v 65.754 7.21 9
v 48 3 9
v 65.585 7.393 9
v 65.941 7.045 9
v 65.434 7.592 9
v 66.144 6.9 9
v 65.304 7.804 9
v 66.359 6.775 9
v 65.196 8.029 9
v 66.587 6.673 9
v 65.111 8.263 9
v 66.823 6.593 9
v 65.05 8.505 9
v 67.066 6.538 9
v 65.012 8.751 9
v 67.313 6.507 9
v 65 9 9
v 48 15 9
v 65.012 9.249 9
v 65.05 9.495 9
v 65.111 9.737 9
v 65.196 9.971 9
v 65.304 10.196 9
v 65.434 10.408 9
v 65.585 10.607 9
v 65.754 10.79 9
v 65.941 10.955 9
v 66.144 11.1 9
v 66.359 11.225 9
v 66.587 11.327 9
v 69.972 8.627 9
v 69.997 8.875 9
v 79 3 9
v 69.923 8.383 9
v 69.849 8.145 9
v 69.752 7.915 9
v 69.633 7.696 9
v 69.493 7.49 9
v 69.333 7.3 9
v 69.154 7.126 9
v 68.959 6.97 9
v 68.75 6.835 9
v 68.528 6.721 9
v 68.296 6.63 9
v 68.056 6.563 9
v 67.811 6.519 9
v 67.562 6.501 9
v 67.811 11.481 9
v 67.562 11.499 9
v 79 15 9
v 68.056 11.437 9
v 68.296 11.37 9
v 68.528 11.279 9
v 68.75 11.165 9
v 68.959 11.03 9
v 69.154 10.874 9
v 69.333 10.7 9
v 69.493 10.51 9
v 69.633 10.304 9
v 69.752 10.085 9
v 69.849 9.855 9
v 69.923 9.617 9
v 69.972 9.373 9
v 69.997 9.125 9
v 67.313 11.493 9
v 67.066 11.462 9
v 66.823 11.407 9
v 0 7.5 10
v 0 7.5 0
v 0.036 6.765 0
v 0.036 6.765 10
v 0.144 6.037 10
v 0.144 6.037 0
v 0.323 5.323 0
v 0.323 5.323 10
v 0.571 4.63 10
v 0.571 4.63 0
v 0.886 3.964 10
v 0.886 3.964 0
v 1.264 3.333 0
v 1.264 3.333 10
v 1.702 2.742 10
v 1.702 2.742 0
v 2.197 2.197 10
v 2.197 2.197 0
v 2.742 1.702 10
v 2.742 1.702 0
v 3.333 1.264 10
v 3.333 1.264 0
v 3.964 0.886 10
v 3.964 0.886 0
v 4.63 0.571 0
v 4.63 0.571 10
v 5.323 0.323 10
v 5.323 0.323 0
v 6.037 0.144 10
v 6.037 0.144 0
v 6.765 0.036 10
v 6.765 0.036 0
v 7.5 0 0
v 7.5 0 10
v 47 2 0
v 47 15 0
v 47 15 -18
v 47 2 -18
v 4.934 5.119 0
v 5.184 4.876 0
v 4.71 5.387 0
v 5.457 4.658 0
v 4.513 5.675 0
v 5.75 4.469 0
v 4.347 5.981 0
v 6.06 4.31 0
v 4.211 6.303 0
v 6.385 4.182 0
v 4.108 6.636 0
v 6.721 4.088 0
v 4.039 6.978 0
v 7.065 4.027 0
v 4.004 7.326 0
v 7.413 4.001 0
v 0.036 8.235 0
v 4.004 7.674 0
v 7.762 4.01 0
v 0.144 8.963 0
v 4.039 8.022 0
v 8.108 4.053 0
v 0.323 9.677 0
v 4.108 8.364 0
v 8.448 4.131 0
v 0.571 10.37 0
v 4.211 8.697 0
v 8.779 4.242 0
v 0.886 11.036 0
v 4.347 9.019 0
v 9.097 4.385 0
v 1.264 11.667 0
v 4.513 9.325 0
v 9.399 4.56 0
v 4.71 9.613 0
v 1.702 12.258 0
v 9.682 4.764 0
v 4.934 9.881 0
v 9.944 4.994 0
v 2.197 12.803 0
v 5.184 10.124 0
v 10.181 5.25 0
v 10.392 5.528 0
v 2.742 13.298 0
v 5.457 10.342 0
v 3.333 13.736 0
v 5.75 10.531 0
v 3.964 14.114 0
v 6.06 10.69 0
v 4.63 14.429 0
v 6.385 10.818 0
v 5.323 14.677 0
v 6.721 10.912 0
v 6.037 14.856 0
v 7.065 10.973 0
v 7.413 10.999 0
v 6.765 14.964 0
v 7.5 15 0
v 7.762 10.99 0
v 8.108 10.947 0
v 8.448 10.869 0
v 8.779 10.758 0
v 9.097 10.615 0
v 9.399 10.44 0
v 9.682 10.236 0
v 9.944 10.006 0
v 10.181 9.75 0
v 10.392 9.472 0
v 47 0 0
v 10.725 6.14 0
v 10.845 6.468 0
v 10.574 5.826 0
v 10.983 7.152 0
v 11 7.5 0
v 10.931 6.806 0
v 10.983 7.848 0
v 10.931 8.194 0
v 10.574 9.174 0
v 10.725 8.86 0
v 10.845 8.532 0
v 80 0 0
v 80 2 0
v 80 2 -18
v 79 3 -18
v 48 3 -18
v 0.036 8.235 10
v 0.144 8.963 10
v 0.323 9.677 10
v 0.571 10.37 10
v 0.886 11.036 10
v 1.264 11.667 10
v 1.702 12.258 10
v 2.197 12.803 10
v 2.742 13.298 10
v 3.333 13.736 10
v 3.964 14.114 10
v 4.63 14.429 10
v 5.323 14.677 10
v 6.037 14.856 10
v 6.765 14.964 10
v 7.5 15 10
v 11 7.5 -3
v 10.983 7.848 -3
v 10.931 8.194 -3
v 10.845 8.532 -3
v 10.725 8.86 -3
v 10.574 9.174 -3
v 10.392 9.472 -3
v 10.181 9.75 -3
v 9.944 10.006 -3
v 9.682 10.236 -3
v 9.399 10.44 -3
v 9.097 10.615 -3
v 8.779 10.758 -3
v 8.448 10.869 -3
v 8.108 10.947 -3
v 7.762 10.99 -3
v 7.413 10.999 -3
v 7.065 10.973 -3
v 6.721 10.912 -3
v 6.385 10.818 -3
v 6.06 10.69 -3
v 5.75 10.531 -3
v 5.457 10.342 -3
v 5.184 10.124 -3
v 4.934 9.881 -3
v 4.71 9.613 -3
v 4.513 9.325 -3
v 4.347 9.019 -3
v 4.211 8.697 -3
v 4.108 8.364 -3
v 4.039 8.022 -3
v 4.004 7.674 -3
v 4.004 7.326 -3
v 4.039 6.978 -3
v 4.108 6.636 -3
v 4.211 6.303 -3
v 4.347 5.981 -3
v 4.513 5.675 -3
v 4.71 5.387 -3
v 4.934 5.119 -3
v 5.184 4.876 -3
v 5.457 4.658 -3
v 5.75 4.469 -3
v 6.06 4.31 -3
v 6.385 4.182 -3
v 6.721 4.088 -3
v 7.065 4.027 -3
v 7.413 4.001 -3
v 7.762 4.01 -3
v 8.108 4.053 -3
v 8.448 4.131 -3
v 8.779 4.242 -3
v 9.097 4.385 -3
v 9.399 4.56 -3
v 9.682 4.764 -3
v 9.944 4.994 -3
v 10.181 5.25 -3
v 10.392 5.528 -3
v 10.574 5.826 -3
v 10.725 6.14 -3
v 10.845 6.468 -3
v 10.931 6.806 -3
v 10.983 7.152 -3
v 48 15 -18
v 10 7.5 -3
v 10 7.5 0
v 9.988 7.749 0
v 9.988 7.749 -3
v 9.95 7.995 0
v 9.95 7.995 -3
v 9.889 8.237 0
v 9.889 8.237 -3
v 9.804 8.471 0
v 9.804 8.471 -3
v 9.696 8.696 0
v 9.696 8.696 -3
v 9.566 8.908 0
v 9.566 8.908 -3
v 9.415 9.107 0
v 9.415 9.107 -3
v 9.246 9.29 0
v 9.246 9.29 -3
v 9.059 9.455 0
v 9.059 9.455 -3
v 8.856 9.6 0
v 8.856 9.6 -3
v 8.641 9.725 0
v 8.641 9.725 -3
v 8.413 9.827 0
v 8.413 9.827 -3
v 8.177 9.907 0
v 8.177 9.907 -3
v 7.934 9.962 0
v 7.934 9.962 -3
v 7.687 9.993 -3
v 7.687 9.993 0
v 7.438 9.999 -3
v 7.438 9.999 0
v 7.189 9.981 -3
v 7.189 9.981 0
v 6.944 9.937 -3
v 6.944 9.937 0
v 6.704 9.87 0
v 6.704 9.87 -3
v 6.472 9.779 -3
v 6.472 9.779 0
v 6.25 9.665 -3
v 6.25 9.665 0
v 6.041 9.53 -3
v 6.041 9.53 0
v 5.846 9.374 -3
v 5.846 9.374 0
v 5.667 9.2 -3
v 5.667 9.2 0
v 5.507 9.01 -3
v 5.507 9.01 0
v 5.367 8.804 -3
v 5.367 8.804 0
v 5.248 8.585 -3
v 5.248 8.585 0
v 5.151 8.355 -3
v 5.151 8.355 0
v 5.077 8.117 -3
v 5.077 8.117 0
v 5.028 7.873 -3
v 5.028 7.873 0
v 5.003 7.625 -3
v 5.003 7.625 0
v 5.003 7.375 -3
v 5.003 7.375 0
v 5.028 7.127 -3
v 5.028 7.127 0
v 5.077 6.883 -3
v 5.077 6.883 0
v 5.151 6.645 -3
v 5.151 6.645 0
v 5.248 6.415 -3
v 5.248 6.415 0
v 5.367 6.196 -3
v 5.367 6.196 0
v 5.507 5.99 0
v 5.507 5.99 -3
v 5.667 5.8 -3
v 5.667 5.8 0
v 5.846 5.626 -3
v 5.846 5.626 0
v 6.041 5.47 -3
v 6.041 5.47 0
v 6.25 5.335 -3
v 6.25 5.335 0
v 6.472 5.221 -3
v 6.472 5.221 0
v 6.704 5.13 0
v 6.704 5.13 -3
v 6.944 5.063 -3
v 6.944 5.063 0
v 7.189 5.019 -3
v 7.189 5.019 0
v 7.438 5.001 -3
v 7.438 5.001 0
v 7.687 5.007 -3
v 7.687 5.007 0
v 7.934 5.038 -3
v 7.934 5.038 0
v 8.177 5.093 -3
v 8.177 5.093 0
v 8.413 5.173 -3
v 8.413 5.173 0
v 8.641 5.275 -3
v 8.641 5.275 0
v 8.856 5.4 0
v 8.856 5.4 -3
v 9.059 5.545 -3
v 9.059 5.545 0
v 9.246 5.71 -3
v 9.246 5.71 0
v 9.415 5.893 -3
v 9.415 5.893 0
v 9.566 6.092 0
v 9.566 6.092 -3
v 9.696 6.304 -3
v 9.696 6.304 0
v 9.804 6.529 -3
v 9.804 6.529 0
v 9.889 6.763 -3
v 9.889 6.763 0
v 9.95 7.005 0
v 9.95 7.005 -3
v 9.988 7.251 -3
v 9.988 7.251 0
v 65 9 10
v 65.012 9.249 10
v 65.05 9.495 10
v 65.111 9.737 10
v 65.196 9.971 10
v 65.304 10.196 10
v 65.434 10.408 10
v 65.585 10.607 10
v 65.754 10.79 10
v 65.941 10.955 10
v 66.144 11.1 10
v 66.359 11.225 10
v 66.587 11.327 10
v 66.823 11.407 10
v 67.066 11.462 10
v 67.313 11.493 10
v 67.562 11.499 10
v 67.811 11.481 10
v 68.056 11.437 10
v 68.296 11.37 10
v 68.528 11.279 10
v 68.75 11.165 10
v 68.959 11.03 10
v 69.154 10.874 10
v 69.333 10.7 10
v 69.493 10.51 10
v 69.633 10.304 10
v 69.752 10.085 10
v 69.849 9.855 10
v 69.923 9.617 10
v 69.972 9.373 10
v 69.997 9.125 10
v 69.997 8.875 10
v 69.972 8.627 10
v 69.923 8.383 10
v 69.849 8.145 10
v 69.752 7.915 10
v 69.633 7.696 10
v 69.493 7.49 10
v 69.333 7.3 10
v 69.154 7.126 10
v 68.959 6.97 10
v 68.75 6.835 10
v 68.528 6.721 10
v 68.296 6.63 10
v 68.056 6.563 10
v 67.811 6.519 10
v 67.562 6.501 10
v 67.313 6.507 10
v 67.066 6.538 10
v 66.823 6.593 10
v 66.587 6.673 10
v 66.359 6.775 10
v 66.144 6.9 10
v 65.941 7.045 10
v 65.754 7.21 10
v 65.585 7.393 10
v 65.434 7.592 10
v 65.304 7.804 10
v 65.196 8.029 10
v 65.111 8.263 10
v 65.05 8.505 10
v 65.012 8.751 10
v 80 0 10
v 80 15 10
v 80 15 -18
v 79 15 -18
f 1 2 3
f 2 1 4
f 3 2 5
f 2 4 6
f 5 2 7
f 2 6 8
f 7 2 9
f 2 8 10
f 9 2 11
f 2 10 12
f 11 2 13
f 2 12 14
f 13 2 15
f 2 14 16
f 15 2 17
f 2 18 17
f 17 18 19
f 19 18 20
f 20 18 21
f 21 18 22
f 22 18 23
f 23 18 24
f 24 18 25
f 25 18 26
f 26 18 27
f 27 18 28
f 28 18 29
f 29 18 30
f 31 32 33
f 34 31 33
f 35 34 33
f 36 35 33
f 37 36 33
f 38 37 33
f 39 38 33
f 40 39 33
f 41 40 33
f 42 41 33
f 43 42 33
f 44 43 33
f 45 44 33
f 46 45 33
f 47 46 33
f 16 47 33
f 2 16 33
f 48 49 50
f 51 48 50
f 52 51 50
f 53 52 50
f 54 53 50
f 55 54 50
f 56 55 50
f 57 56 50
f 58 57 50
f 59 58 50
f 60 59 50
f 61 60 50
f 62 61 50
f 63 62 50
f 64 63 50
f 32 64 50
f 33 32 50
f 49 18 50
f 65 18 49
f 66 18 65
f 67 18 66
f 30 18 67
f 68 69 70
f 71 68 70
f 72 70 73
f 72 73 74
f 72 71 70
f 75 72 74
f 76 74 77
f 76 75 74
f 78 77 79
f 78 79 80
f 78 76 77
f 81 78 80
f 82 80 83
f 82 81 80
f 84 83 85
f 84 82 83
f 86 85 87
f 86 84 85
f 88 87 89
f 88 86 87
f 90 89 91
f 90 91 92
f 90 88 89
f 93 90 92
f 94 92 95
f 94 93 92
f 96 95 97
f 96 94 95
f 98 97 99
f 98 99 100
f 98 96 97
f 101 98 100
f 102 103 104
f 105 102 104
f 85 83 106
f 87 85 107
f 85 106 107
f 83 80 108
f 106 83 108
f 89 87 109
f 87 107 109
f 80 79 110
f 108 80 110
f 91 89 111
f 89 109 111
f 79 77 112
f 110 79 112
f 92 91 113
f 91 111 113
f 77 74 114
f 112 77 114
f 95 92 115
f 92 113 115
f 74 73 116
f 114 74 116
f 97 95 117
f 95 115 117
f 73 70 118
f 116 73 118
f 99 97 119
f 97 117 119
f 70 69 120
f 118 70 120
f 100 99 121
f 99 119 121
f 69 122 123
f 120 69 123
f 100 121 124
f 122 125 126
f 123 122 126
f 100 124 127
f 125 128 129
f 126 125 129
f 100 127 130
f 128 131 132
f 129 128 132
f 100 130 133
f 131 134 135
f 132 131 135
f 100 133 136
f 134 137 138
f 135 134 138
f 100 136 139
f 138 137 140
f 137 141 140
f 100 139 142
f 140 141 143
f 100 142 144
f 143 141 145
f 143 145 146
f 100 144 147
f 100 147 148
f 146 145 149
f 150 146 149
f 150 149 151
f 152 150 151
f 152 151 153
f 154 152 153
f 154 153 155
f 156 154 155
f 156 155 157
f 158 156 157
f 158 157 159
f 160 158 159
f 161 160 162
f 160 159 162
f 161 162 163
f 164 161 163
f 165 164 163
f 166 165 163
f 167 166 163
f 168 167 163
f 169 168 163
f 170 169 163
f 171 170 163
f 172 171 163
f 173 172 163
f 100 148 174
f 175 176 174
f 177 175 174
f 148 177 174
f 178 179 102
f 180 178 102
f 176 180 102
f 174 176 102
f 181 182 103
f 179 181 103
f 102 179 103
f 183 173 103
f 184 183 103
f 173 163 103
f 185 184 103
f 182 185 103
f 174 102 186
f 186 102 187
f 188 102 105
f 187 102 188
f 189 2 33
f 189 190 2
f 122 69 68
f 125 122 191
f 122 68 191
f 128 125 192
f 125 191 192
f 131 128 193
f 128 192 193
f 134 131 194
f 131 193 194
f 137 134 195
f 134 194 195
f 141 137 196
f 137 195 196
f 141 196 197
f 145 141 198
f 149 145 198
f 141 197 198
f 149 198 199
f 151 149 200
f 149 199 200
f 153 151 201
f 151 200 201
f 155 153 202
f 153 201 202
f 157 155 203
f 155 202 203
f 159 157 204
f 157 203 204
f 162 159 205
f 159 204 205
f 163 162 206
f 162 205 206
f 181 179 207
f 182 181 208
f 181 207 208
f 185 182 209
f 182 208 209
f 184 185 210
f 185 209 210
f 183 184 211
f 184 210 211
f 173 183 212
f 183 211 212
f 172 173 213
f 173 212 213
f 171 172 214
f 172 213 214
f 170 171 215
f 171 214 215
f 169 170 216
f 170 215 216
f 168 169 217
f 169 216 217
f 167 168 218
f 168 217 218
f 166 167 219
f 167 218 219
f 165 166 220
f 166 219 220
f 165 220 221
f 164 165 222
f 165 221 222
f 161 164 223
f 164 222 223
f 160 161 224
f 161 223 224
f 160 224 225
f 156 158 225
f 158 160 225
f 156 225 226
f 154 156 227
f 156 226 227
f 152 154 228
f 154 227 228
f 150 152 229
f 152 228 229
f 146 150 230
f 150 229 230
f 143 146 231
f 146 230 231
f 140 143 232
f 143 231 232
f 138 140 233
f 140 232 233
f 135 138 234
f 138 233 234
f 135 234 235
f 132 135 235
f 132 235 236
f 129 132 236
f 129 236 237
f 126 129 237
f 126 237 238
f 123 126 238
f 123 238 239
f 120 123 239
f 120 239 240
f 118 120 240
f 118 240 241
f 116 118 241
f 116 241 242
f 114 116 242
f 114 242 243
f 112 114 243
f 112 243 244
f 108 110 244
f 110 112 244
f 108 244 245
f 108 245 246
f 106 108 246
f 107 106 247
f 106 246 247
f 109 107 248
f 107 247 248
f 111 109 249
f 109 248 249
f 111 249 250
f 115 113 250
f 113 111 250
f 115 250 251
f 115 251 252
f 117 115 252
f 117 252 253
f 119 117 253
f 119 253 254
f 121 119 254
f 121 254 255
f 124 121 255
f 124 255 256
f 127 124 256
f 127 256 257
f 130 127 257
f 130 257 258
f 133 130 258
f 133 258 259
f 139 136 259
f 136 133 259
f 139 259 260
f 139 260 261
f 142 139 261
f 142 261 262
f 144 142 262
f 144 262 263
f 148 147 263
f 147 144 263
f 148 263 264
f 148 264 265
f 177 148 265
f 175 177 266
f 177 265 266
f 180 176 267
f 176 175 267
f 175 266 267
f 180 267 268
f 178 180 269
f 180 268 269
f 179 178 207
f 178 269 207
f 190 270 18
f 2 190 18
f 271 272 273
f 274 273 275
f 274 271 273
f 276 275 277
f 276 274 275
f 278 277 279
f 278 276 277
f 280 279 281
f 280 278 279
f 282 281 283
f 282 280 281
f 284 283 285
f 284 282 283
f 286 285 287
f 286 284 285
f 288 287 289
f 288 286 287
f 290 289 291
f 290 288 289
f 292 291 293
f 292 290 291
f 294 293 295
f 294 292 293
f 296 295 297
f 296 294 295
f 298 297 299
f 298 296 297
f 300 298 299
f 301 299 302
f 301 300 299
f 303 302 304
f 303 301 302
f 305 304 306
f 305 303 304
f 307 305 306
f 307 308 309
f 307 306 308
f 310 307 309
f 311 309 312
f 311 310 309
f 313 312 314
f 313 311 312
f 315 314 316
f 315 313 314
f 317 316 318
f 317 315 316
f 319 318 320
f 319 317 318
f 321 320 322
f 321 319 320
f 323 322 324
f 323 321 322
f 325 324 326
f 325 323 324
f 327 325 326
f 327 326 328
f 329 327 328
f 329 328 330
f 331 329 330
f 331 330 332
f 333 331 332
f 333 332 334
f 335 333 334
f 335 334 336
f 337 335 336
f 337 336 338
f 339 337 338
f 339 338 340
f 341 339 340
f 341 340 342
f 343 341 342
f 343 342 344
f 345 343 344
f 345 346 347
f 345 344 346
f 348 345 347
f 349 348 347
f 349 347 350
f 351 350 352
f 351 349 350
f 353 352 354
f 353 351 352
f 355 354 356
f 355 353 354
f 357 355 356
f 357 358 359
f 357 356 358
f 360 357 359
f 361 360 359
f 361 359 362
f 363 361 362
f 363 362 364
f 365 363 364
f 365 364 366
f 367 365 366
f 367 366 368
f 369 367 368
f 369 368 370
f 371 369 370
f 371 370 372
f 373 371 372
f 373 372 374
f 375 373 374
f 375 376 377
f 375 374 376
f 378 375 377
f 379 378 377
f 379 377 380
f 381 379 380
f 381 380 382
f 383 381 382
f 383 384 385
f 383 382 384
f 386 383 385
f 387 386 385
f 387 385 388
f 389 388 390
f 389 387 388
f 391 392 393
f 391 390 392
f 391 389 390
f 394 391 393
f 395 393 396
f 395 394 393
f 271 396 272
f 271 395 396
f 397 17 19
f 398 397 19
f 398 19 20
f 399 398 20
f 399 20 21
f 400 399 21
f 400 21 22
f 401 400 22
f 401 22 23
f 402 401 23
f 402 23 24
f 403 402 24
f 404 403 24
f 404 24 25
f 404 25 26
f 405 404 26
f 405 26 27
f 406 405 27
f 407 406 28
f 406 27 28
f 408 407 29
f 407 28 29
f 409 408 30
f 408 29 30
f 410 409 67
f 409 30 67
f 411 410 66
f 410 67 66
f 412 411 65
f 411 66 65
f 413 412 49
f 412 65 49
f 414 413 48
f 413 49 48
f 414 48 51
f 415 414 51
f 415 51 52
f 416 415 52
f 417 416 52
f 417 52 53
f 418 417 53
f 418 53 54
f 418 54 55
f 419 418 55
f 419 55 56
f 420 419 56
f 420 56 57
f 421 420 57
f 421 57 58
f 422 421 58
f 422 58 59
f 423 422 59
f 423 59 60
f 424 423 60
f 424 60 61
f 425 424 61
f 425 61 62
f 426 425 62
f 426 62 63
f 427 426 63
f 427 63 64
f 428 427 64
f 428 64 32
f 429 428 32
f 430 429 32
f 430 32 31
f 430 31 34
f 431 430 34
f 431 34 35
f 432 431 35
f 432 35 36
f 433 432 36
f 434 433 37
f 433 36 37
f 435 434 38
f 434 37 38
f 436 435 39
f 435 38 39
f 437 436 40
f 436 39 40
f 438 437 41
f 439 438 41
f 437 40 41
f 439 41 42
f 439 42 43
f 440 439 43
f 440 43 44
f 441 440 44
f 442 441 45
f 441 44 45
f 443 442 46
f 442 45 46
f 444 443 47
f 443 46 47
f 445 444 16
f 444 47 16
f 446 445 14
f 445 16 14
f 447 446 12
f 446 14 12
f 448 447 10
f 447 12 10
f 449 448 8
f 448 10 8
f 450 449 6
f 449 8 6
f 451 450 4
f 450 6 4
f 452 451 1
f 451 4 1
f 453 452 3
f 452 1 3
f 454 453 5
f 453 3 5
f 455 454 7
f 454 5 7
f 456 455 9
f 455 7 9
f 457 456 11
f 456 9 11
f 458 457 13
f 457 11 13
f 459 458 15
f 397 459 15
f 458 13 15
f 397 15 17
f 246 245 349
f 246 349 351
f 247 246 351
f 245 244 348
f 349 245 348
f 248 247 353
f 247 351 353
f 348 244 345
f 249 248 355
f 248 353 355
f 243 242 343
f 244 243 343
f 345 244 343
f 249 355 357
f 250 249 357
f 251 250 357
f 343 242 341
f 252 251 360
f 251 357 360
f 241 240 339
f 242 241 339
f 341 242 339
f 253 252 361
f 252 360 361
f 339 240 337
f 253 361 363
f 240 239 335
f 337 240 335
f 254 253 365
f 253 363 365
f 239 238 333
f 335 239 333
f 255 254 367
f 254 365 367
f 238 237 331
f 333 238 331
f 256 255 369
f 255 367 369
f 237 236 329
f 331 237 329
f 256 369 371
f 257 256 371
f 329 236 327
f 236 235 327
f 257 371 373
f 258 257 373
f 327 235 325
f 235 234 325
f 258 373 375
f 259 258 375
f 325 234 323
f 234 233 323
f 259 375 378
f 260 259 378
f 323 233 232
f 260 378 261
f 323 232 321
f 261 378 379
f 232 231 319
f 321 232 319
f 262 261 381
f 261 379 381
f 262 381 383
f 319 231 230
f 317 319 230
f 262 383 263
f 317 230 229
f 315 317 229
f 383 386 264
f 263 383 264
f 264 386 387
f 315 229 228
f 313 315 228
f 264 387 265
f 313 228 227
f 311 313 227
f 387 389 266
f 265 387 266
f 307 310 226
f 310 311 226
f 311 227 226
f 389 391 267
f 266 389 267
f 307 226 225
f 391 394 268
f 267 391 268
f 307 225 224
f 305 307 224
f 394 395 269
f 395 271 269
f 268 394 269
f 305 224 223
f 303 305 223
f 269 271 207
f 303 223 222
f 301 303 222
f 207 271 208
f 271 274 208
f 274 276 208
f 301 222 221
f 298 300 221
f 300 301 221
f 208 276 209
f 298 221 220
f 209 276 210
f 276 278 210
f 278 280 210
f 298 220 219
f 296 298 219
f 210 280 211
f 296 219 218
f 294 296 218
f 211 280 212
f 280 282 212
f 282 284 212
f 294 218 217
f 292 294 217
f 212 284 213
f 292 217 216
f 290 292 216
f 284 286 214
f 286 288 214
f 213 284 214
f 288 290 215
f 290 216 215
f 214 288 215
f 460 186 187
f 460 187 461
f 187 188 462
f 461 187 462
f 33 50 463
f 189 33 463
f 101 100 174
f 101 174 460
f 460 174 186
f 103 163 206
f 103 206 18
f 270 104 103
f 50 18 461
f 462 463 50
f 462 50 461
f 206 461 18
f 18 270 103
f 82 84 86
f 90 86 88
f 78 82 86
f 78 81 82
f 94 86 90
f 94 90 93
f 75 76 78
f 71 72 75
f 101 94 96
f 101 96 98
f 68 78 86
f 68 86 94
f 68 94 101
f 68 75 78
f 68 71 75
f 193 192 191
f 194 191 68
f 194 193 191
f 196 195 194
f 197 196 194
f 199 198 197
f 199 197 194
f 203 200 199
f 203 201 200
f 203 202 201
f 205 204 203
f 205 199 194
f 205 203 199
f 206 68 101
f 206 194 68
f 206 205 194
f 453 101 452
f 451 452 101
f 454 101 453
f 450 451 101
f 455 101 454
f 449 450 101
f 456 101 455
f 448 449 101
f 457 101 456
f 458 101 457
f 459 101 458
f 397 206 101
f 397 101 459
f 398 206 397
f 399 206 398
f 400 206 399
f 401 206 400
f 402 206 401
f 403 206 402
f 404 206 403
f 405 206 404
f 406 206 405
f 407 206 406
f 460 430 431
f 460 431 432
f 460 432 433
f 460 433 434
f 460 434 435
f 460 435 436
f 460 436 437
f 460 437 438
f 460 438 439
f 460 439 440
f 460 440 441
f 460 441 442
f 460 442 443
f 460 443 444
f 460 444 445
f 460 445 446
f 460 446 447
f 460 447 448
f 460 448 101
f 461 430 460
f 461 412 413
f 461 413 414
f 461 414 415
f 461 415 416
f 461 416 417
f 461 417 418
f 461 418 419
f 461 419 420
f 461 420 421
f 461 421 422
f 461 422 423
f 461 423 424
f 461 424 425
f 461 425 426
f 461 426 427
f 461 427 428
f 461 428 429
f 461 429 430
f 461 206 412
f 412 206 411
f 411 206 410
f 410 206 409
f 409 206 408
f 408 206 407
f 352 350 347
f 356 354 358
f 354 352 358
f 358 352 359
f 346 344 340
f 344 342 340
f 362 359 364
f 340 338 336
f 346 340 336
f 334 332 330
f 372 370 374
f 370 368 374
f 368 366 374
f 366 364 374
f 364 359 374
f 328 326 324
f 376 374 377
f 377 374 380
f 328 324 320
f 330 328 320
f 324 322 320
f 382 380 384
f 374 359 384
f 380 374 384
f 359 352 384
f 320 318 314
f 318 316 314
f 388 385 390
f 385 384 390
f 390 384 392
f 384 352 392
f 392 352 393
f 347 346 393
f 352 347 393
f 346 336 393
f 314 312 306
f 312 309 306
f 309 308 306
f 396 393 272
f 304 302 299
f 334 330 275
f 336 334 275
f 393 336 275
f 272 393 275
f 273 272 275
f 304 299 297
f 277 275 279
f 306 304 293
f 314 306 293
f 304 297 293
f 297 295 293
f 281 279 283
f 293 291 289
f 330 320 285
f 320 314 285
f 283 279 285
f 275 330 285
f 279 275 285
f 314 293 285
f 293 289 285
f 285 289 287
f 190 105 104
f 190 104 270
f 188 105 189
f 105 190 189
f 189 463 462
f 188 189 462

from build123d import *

# Parameters (mm, degrees)
SKETCH1_W                = 80
SKETCH1_H                = 15
BOSS_EXTRUDE1_DEPTH      = 10
FILLET1_R                = 7.5
BOSS_EXTRUDE2_DEPTH      = 2
BOSS_EXTRUDE2_DEPTH_BACK = 13
SKETCH2_R                = 3.5
SKETCH2_R_2              = 2.5
SKETCH4_W                = 12.275600057
SKETCH4_H                = 15
CUT_EXTRUDE1_DEPTH       = 39
SKETCH6_W                = 10
SKETCH6_H                = 14.887271561
CUT_EXTRUDE2_DEPTH       = 39
SKETCH8_W                = 33
SKETCH8_H                = 28
BOSS_EXTRUDE3_DEPTH      = 15
CUT_EXTRUDE3_DEPTH       = 12
SKETCH10_W               = 33
SKETCH10_H               = 18
CUT_EXTRUDE4_DEPTH       = 2
SKETCH11_W               = 11.438718319
SKETCH11_H               = 15
CUT_EXTRUDE5_DEPTH       = 84.360662185
SKETCH12_R               = 2.5
CUT_EXTRUDE6_DEPTH       = 86.755466298


with BuildPart() as part:
    # Sketch1 → Boss-Extrude1 (new body)
    with BuildSketch(Plane.XY):
        with Locations((40, 7.5)):
            Rectangle(SKETCH1_W, SKETCH1_H)
    extrude(amount=BOSS_EXTRUDE1_DEPTH)

    # Fillet1
    fillet1_edges = [part.edges().sort_by_distance(p)[0] for p in [
        (0, 0, 5),
        (0, 15, 5),
    ]]
    fillet(fillet1_edges, radius=FILLET1_R - 0.0001)  # a hair under: the kernel refuses the full size

    # Sketch2 → Boss-Extrude2 (add, two sides: drawn at the far end of the back side and taken through both)
    # profile 1 of 2: a face of its own
    with BuildSketch(Plane.XY.offset(10).offset(-BOSS_EXTRUDE2_DEPTH_BACK)):
        with Locations((7.5, 7.5)):
            Circle(SKETCH2_R)
        with Locations((7.5, 7.5)):
            Circle(SKETCH2_R_2, mode=Mode.SUBTRACT)
    # profile 2 of 2: a face of its own
    with BuildSketch(Plane.XY.offset(10).offset(-BOSS_EXTRUDE2_DEPTH_BACK)):
        with Locations((72.5, 7.5)):
            Circle(SKETCH2_R)
        with Locations((72.5, 7.5)):
            Circle(SKETCH2_R_2, mode=Mode.SUBTRACT)
    extrude(amount=BOSS_EXTRUDE2_DEPTH + BOSS_EXTRUDE2_DEPTH_BACK)

    # Sketch4 → Cut-Extrude1 (cut)
    with BuildSketch(Plane(origin=(80, 0, 0), x_dir=(0, 0, -1), z_dir=(1, 0, 0))):
        with Locations((6.137800029, 7.5)):
            Rectangle(SKETCH4_W, SKETCH4_H)
    extrude(amount=-CUT_EXTRUDE1_DEPTH, mode=Mode.SUBTRACT)

    # Sketch6 → Cut-Extrude2 (cut)
    with BuildSketch(Plane(origin=(0, 0, 0), x_dir=(0, 0, -1), z_dir=(1, 0, 0))):
        with Locations((-15, 7.443635781)):
            Rectangle(SKETCH6_W, SKETCH6_H)
    extrude(amount=CUT_EXTRUDE2_DEPTH, mode=Mode.SUBTRACT)

    # Sketch8 → Boss-Extrude3 (add)
    with BuildSketch(Plane(origin=(0, 15, 0), x_dir=(1, 0, 0), z_dir=(0, 1, 0))):
        with Locations((63.5, 4)):
            Rectangle(SKETCH8_W, SKETCH8_H)
    extrude(amount=-BOSS_EXTRUDE3_DEPTH)

    # Sketch9 → Cut-Extrude3 (cut)
    with BuildSketch(Plane(origin=(0, 15, 0), x_dir=(1, 0, 0), z_dir=(0, 1, 0))):
        Polygon((48, 17), (48, -9), (79, -9), (79, 17), (79, 18), (48, 18), align=None)
    extrude(amount=-CUT_EXTRUDE3_DEPTH, mode=Mode.SUBTRACT)

    # Sketch10 → Cut-Extrude4 (cut)
    with BuildSketch(Plane.XZ):
        with Locations((63.5, -9)):
            Rectangle(SKETCH10_W, SKETCH10_H)
    extrude(amount=-CUT_EXTRUDE4_DEPTH, mode=Mode.SUBTRACT)

    # Sketch11 → Cut-Extrude5 (cut, through all)
    with BuildSketch(Plane(origin=(80, 0, 0), x_dir=(0, 0, -1), z_dir=(1, 0, 0))):
        with Locations((-15.71935916, 7.5)):
            Rectangle(SKETCH11_W, SKETCH11_H)
    extrude(amount=-CUT_EXTRUDE5_DEPTH, mode=Mode.SUBTRACT)

    # Sketch12 → Cut-Extrude6 (cut, through all)
    with BuildSketch(Plane(origin=(0, 0, 9), x_dir=(-1, 0, 0), z_dir=(0, 0, -1))):
        with Locations((-67.5, 9)):
            Circle(SKETCH12_R)
    extrude(amount=-CUT_EXTRUDE6_DEPTH, mode=Mode.SUBTRACT)


solid = part.part
